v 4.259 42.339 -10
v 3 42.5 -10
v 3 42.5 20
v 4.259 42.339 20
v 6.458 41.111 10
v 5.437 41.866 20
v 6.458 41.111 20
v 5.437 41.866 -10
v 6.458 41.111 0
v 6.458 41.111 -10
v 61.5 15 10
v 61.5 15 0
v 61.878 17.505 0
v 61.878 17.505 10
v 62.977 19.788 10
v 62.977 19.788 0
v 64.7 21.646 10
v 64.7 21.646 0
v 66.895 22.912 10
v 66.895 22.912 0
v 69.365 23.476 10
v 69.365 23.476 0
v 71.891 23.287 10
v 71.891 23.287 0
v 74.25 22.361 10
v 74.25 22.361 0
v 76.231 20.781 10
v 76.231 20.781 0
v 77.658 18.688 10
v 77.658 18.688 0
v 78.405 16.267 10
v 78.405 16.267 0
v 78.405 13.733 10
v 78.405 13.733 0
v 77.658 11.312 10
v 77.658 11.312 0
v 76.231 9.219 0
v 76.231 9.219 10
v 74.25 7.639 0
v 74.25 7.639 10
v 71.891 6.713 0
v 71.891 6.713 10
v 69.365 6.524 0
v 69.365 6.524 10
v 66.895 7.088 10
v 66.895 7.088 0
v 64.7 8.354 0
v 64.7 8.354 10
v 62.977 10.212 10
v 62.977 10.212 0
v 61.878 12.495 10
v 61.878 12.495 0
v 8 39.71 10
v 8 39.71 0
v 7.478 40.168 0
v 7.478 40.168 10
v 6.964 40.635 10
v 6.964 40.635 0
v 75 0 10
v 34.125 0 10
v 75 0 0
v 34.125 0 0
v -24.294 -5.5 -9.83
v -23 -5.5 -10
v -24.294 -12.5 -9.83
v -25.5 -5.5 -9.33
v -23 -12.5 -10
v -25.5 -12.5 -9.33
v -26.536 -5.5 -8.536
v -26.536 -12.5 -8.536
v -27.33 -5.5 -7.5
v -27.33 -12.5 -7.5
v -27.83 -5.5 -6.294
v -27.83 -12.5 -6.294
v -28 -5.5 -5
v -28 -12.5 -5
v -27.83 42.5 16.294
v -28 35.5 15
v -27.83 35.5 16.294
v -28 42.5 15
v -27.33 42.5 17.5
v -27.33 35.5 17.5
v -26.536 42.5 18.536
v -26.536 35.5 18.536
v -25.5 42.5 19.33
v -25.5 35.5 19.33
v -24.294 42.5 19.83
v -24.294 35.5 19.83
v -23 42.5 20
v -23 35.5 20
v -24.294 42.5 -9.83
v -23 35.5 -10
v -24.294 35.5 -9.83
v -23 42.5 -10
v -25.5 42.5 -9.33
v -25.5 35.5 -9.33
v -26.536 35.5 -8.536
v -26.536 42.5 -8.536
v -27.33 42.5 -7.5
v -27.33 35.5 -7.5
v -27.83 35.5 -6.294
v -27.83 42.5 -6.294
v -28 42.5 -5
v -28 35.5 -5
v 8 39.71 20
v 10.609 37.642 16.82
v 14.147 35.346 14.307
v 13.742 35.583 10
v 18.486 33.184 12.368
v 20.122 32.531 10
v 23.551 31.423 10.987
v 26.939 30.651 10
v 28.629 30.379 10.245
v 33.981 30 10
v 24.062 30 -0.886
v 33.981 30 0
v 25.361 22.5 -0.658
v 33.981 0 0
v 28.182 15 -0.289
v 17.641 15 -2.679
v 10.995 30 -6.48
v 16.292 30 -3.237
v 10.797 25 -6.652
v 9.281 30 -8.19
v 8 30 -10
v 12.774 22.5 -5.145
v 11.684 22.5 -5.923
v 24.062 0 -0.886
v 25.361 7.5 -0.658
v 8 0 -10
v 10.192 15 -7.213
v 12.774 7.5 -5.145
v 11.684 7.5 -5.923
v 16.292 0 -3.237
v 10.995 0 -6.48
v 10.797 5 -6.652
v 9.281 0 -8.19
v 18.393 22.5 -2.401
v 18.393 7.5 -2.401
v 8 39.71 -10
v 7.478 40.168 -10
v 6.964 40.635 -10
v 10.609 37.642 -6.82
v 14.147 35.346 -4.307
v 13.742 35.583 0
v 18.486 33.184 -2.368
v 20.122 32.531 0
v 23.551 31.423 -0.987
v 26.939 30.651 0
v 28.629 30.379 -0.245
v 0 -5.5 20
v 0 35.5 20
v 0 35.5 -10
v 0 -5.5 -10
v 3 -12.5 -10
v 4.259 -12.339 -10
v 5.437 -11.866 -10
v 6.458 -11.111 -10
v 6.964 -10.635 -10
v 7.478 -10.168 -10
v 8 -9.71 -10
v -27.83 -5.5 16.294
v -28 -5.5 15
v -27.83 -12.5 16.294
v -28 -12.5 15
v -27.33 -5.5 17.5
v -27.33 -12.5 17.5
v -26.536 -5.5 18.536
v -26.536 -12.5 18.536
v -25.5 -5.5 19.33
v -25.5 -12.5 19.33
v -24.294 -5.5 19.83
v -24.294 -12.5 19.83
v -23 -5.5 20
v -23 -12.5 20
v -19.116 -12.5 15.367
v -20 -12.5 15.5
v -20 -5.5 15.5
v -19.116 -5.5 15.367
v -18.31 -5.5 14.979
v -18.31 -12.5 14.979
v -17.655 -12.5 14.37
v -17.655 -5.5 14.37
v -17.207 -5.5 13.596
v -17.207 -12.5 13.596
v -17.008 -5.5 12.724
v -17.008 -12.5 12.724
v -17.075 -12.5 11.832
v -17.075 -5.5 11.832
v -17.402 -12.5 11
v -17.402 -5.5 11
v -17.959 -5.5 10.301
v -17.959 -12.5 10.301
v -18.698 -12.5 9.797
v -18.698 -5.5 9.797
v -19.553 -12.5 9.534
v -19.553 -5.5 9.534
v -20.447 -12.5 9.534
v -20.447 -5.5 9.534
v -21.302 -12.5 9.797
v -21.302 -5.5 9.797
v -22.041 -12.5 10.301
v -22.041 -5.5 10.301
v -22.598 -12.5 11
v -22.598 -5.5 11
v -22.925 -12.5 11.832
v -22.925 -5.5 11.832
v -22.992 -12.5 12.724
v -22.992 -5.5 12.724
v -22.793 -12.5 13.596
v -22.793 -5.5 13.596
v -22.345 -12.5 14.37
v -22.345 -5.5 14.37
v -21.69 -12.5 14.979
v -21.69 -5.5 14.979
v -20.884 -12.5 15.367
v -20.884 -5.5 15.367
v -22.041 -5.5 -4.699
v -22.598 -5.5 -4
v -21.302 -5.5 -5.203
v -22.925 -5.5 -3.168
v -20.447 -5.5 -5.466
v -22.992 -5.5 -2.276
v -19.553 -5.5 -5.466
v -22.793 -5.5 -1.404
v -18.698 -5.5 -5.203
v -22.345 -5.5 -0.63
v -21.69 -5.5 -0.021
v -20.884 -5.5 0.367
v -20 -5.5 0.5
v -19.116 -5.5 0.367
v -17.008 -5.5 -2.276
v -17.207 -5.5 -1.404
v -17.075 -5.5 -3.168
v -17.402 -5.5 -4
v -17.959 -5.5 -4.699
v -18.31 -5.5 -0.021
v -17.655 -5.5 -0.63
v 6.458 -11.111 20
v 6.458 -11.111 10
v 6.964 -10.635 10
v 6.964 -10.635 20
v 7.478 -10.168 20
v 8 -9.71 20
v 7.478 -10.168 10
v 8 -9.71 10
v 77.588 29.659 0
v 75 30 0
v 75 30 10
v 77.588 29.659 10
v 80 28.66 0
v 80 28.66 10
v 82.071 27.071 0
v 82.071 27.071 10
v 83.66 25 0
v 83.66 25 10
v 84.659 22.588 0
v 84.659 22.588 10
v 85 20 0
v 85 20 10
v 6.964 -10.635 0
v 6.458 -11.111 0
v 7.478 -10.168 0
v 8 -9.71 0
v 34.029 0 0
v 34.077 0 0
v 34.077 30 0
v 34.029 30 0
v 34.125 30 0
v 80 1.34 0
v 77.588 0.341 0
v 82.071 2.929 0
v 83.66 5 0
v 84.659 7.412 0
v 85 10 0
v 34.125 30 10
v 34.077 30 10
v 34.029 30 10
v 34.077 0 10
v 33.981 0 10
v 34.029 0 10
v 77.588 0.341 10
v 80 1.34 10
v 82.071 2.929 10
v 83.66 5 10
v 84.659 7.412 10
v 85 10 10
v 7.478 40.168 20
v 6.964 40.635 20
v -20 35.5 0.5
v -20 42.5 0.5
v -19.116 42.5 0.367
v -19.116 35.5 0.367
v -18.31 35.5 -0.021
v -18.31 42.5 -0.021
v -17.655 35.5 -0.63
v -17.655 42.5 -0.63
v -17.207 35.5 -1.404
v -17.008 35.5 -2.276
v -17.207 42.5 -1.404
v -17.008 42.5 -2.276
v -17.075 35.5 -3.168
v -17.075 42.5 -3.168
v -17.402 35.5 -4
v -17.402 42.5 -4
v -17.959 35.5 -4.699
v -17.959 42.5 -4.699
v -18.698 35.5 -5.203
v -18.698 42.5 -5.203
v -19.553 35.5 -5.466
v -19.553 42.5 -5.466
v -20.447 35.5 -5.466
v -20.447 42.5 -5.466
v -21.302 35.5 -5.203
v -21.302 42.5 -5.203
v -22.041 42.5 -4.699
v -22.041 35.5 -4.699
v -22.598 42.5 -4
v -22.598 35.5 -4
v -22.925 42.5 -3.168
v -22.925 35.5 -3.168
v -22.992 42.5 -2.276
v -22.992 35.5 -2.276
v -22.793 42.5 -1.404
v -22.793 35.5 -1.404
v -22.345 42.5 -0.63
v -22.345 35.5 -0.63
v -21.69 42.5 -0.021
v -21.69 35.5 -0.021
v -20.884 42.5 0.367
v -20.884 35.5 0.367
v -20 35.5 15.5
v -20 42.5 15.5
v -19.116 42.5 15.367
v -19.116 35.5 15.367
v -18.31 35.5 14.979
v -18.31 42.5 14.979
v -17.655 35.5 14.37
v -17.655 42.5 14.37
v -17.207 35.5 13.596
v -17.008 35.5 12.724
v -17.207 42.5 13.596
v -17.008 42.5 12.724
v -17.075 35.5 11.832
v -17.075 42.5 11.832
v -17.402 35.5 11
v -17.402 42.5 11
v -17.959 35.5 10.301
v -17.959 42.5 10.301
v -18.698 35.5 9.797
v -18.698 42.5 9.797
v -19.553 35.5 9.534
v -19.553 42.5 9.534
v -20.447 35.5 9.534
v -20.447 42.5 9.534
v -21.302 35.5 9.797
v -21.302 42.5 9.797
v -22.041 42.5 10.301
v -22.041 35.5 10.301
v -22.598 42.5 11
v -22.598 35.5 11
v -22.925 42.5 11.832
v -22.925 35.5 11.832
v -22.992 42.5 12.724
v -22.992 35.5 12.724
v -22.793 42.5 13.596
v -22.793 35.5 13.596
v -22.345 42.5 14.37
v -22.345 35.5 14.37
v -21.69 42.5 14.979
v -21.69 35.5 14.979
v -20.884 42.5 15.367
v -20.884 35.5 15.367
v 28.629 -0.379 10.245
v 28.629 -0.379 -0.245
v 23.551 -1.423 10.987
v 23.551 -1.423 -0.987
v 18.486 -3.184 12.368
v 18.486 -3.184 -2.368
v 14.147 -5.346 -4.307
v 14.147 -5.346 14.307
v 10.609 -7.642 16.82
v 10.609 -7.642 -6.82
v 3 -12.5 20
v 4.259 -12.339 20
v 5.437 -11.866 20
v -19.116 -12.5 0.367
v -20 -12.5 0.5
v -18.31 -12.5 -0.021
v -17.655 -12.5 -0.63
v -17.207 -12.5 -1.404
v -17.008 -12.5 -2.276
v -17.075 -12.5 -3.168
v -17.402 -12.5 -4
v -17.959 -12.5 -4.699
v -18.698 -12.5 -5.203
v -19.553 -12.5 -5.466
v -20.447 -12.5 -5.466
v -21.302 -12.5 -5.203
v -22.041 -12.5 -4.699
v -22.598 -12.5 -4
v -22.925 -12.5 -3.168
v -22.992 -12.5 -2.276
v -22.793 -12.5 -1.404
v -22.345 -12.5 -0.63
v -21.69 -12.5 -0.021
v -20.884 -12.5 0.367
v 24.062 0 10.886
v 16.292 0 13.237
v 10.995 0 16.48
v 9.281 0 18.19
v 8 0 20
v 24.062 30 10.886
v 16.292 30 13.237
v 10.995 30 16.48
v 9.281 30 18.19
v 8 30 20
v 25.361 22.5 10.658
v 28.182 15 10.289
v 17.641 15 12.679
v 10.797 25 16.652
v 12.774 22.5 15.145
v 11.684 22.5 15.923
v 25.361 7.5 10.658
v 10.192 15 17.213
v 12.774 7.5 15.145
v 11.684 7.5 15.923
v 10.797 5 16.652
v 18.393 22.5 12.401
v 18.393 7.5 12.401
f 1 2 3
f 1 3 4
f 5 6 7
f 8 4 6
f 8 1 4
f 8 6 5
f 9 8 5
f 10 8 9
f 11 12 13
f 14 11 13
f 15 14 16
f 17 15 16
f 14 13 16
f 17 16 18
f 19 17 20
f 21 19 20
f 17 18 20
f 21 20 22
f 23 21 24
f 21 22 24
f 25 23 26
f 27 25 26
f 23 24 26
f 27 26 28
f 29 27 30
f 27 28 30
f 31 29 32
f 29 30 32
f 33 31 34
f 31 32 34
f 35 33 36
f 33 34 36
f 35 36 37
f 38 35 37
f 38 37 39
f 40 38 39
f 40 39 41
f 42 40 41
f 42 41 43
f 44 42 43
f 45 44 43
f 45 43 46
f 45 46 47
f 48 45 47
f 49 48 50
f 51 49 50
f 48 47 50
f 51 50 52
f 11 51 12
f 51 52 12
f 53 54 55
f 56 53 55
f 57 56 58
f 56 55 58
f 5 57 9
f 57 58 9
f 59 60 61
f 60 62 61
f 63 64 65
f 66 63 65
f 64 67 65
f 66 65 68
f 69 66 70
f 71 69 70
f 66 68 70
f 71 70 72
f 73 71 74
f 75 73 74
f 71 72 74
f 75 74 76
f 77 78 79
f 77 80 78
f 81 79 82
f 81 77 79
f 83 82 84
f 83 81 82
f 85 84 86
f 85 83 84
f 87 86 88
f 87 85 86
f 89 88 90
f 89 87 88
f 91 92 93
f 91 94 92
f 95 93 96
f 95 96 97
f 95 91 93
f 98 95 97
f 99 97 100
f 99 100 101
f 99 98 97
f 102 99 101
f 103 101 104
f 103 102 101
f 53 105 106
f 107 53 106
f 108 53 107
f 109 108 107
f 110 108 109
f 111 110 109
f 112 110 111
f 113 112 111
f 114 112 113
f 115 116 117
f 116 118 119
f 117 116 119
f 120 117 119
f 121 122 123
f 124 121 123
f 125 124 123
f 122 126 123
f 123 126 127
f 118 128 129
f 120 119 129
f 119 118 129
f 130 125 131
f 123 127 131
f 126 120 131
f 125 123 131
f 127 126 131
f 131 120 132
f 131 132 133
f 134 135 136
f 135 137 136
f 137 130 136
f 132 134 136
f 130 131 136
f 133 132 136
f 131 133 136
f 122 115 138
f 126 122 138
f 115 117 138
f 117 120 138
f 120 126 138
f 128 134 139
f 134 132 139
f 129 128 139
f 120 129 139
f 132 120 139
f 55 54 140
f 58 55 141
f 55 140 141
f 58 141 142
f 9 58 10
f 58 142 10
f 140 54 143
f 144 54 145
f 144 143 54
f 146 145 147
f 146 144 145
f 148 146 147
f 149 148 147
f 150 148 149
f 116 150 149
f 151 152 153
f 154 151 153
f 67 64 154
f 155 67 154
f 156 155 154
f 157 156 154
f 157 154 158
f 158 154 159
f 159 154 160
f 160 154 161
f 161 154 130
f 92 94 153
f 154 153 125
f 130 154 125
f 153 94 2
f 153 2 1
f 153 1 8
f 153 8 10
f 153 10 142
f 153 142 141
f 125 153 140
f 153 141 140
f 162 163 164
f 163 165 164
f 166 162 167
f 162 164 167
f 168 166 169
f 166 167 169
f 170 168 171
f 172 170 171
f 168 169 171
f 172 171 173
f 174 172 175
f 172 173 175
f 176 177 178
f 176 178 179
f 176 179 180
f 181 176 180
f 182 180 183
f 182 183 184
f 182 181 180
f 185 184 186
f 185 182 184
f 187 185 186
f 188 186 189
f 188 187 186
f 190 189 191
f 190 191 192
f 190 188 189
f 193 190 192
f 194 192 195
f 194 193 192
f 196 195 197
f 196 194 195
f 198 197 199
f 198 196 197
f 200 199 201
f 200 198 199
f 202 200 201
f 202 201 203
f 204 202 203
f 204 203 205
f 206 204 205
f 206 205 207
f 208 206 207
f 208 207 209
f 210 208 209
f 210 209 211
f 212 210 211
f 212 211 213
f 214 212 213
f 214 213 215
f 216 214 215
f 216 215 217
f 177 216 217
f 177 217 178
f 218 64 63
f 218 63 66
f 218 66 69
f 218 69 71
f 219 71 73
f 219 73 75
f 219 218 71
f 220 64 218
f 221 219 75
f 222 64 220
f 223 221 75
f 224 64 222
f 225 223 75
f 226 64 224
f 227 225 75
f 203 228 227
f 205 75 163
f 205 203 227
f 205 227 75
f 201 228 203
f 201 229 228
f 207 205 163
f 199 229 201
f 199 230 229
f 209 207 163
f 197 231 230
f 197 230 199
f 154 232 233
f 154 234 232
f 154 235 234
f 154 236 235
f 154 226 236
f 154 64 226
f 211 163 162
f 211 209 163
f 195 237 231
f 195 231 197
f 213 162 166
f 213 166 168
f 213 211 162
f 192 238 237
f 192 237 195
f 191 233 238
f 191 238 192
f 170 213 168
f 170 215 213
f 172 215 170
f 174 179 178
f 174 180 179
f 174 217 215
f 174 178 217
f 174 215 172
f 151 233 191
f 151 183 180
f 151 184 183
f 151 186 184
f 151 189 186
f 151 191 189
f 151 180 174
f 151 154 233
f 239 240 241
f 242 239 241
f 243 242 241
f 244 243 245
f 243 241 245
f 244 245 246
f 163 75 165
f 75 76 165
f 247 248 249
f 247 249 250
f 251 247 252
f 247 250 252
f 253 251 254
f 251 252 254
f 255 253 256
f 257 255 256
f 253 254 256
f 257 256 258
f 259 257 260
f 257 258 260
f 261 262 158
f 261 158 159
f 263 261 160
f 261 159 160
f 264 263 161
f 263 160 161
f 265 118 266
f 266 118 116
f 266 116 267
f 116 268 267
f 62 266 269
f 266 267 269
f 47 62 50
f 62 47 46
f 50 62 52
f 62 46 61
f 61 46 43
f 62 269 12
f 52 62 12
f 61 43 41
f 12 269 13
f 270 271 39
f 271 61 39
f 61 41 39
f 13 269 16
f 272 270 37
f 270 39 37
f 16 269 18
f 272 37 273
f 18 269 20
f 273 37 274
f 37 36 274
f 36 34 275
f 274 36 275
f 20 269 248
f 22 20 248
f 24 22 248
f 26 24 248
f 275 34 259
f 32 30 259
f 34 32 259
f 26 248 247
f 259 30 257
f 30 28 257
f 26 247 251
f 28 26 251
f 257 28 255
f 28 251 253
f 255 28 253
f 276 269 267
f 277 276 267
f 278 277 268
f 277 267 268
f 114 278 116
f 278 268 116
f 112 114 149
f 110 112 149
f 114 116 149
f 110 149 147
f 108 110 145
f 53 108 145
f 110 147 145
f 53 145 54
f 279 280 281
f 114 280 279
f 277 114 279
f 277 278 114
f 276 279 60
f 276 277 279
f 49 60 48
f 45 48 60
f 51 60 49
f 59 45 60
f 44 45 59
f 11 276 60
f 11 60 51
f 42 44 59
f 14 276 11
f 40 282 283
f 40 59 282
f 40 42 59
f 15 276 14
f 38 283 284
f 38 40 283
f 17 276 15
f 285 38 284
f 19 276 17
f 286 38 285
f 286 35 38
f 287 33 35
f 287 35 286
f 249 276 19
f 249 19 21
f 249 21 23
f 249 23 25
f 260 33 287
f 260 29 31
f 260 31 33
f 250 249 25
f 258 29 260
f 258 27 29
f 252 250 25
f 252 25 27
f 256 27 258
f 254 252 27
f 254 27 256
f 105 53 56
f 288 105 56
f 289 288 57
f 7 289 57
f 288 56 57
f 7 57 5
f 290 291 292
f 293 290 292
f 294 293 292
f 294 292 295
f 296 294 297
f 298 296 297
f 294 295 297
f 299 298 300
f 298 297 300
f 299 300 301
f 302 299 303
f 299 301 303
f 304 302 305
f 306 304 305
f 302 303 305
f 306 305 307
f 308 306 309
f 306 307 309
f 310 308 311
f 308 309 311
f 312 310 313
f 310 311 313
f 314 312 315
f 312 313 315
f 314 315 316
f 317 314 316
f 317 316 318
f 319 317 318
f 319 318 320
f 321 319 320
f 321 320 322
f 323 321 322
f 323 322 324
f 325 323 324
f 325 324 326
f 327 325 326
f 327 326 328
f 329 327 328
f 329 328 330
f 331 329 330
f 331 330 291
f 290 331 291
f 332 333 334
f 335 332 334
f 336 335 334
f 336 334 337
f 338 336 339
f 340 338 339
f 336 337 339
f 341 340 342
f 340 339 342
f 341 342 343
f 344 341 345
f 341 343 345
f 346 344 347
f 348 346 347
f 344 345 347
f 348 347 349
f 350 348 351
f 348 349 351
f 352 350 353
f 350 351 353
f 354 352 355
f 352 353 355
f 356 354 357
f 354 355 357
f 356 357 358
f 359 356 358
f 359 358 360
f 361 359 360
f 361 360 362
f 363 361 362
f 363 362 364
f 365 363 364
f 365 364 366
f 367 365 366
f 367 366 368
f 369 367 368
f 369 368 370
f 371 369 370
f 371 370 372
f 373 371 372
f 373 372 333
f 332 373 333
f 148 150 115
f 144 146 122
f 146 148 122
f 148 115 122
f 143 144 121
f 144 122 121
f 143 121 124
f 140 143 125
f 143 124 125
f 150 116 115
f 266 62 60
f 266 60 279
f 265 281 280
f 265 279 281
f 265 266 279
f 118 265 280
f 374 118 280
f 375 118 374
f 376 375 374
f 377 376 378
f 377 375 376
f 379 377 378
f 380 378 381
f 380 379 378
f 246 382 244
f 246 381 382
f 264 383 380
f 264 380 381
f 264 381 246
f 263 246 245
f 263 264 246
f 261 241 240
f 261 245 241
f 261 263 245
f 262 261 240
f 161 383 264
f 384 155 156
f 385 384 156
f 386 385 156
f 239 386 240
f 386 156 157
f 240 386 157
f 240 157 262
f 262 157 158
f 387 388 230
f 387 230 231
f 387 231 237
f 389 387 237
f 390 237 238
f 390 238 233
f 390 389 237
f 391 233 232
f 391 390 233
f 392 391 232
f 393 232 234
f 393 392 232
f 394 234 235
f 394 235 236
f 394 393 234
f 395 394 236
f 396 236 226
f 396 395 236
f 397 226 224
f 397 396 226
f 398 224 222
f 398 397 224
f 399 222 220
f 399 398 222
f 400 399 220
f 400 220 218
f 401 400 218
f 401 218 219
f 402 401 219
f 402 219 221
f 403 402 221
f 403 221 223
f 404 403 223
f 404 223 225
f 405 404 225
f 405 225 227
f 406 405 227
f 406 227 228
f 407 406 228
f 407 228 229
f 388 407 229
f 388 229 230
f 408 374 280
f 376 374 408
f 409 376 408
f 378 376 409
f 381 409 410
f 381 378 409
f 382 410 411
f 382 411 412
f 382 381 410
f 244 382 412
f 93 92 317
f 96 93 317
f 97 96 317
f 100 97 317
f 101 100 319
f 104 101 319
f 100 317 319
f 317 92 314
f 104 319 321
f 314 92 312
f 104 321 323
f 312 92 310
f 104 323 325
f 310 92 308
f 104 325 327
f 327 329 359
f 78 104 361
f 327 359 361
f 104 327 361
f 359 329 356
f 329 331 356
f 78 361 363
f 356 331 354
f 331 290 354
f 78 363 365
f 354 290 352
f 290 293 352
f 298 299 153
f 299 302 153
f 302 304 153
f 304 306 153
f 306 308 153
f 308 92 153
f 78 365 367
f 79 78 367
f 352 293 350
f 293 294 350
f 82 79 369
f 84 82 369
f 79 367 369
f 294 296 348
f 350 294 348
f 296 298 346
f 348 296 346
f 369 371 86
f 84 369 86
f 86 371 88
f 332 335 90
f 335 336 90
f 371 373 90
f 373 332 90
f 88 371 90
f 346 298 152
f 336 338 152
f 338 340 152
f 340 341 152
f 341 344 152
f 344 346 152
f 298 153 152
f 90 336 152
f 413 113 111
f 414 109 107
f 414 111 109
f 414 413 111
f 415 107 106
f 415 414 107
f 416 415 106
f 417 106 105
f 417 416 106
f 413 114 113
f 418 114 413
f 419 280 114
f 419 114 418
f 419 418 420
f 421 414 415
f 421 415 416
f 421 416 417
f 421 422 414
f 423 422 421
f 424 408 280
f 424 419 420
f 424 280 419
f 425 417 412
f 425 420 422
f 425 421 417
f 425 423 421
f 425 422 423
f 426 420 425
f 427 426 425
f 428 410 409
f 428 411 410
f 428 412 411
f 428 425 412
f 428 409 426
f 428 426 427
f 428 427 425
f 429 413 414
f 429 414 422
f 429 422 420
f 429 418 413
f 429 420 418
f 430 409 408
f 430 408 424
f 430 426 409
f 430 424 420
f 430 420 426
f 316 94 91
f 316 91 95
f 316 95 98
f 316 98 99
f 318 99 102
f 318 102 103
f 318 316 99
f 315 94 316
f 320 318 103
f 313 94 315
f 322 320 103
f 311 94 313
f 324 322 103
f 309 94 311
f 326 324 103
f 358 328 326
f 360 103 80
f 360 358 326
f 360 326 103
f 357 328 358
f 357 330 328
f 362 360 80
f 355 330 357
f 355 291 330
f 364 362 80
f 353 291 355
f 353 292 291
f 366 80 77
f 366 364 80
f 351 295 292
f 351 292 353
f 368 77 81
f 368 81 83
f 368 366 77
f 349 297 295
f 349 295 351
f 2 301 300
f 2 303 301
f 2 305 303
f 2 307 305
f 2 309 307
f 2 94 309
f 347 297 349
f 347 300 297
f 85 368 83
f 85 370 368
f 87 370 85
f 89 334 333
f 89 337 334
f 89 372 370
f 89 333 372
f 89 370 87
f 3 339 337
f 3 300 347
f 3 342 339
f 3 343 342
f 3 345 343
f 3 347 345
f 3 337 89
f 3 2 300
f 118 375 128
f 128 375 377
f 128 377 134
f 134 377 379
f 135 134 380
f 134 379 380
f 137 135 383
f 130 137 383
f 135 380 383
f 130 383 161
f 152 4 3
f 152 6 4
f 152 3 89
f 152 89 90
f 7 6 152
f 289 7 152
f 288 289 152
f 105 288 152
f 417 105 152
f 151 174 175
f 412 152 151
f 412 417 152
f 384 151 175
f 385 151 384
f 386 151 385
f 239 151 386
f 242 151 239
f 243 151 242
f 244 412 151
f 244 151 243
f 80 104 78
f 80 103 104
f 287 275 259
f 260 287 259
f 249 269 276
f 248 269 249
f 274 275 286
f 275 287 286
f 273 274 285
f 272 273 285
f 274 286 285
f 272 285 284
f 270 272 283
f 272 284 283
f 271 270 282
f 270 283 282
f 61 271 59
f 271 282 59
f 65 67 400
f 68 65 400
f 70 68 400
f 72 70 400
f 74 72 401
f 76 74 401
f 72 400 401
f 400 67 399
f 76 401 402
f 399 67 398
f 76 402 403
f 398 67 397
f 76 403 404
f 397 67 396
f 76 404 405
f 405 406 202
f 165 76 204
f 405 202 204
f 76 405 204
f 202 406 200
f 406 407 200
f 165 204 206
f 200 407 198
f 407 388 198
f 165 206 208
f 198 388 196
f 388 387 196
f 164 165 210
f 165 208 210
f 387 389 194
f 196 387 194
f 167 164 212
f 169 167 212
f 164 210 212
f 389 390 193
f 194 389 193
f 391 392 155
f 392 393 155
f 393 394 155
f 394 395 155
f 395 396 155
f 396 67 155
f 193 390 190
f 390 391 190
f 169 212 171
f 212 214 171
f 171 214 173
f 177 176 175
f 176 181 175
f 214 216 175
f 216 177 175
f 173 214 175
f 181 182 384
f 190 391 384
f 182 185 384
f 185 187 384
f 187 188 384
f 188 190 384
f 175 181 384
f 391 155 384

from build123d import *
from build123d.topology import SkipClean

# Parameters (mm, degrees)
SKETCH_1_W             = 85
SKETCH_1_H             = 30
EXTRUDE_1_DEPTH        = 10
EXTRUDE_2_DEPTH        = 10
EXTRUDE_2_DEPTH_BACK   = 20
SKETCH_3_W             = 8
SKETCH_3_H             = 30
SKETCH_2_R             = 8.5
CUT_EXTRUDE_1_DEPTH    = 10
SKETCH_5_W             = 8
SKETCH_5_H             = 30
EXTRUDE_3_DEPTH        = 12.5
SKETCH_6_W             = 30
SKETCH_6_H             = 7
EXTRUDE_4_DEPTH        = 28
CUT_EXTRUDE_2_REACH    = 99.115
SKETCH_7_R             = 3
FILLET_1_R             = 5
FILLET_1_OF_MIRROR_1_R = 5
FILLET_2_DEPTH         = 30
FILLET_3_DEPTH         = 30
FILLET_4_DEPTH         = 10
FILLET_START           = -9.709779072
FILLET_4_2_DEPTH       = 49.419558144
FILLET_START_2         = -11
FILLET_4_3_DEPTH       = 32
FILLET_START_3         = -10
FILLET_4_4_DEPTH       = 30
FILLET_6_R             = 10


with BuildPart() as part:
    # 草图1 → 凸台-拉伸1 (new body)
    with BuildSketch(Plane.XY):
        with Locations((42.5, 15)):
            Rectangle(SKETCH_1_W, SKETCH_1_H)
    extrude(amount=EXTRUDE_1_DEPTH)

    # 草图2 → 切除-拉伸1 (cut)
    with BuildSketch(Plane(origin=(0, 0, 0), x_dir=(-1, 0, 0), z_dir=(0, 0, -1))):
        with Locations((-70, 15)):
            Circle(SKETCH_2_R)
    extrude(amount=-CUT_EXTRUDE_1_DEPTH, mode=Mode.SUBTRACT)



with BuildPart() as body_2:
    # 草图3 → 凸台-拉伸2 (new, two sides: drawn at the far end of the back side and taken through both)
    with BuildSketch(Plane.XY.offset(10).offset(-EXTRUDE_2_DEPTH_BACK)):
        with Locations((4, 15)):
            Rectangle(SKETCH_3_W, SKETCH_3_H)
    extrude(amount=EXTRUDE_2_DEPTH + EXTRUDE_2_DEPTH_BACK)


with BuildPart() as part_1:
    add(part.part)

    add(body_2.part)  # 凸台-拉伸3 merges body 2
    # 草图5 → 凸台-拉伸3 (add)
    with BuildSketch(Plane(origin=(0, 30, 0), x_dir=(1, 0, 0), z_dir=(0, 1, 0))):
        with Locations((4, -5)):
            Rectangle(SKETCH_5_W, SKETCH_5_H)
    extrude_3 = extrude(amount=EXTRUDE_3_DEPTH)

    # 草图6 → 凸台-拉伸4 (add)
    with BuildSketch(Plane.ZY):
        with Locations((5, 39)):
            Rectangle(SKETCH_6_W, SKETCH_6_H)
    extrude_4 = extrude(amount=EXTRUDE_4_DEPTH)

    # 草图7 → 切除-拉伸2 (cut, up to next)
    with BuildSketch(Plane(origin=(0, 42.5, 0), x_dir=(1, 0, 0), z_dir=(0, 1, 0)), mode=Mode.PRIVATE) as cut_extrude_2_sk1:
        with Locations(Location((-20, 2.5, 0), (0, 0, 270))):
            Circle(SKETCH_7_R)
    cut_extrude_2_tool1 = extrude(cut_extrude_2_sk1.sketch, amount=-CUT_EXTRUDE_2_REACH, mode=Mode.PRIVATE) & part_1.part
    # 草图7 → 切除-拉伸2 (cut, up to next)
    with BuildSketch(Plane(origin=(0, 42.5, 0), x_dir=(1, 0, 0), z_dir=(0, 1, 0)), mode=Mode.PRIVATE) as cut_extrude_2_sk2:
        with Locations(Location((-20, -12.5, 0), (0, 0, 270))):
            Circle(SKETCH_7_R)
    cut_extrude_2_tool2 = extrude(cut_extrude_2_sk2.sketch, amount=-CUT_EXTRUDE_2_REACH, mode=Mode.PRIVATE) & part_1.part
    cut_extrude_2_1 = cut_extrude_2_tool1.solids().sort_by_distance((-20, 42.5, -2.5))[0]
    add(cut_extrude_2_1, mode=Mode.SUBTRACT)
    cut_extrude_2_2 = cut_extrude_2_tool2.solids().sort_by_distance((-20, 42.5, 12.5))[0]
    add(cut_extrude_2_2, mode=Mode.SUBTRACT)
    cut_extrude_2 = cut_extrude_2_1 + cut_extrude_2_2  # 切除-拉伸2 as one shape, for the pattern or mirror that repeats it

    # 圆角1
    fillet_1_edges = [part_1.edges().sort_by_distance(p)[0] for p in [
        (8, 42.5, 5),
        (-28, 39, -10),
        (-28, 39, 20),
    ]]
    fillet(fillet_1_edges, radius=FILLET_1_R)

    # 镜向1: 凸台-拉伸3, 凸台-拉伸4, 切除-拉伸2 across plane
    add(extrude_3.mirror(Plane.ZX.offset(15)))
    add(extrude_4.mirror(Plane.ZX.offset(15)))
    add(cut_extrude_2.mirror(Plane.ZX.offset(15)), mode=Mode.SUBTRACT)

    # 圆角1 of 镜向1
    fillet_1_of_mirror_1_edges = [part_1.edges().sort_by_distance(p)[0] for p in [
        (8, -12.5, 5),
        (-28, -9, -10),
        (-28, -9, 20),
    ]]
    fillet(fillet_1_of_mirror_1_edges, radius=FILLET_1_OF_MIRROR_1_R)

    # 圆角2: read off the stored shape, not the designer's step
    # 圆角2 outline → 圆角2 (add)
    with BuildSketch(Plane(origin=(0, 0, 0), x_dir=(1, 0, 0), z_dir=(0, 1, 0))):
        with BuildLine():
            add(Edge.make_bspline(
                [(33.980762114, -10), (13.773502692, -10), (8, -20)],
                knots=[0, 0, 0, 1, 1, 1], degree=2, weights=[1, 0.866025404, 1]))
            Line((33.980762114, -10), (8, -10))
            Line((8, -10), (8, -20))
        make_face()
    extrude(amount=FILLET_2_DEPTH)

    # 圆角3: read off the stored shape, not the designer's step
    # 圆角3 outline → 圆角3 (add)
    with BuildSketch(Plane(origin=(0, 0, 0), x_dir=(1, 0, 0), z_dir=(0, 1, 0))):
        with BuildLine():
            Line((8, 0), (33.980762114, 0))
            add(Edge.make_bspline(
                [(33.980762114, 0), (13.773502692, 0), (8, 10)],
                knots=[0, 0, 0, 1, 1, 1], degree=2, weights=[1, 0.866025404, 1]))
            Line((8, 10), (8, 0))
        make_face()
    extrude(amount=FILLET_3_DEPTH)

    # 圆角4: read off the stored shape, not the designer's step
    # 圆角4 outline → 圆角4 (add)
    with BuildSketch(Plane.XY):
        with BuildLine():
            ThreePointArc((6.458305444, -11.111111111), (19.217629145, -2.881570914), (34.124748995, 0))
            Line((34.124748995, 0), (8, 0))
            Line((8, 0), (8, -7.5))
            ThreePointArc((8, -7.5), (7.598452306, -9.463220922), (6.458305444, -11.111111111))
        make_face()
        with BuildLine():
            ThreePointArc((34.124748995, 30), (19.217629145, 32.881570914), (6.458305444, 41.111111111))
            ThreePointArc((6.458305444, 41.111111111), (7.598452306, 39.463220922), (8, 37.5))
            Line((8, 37.5), (8, 30))
            Line((8, 30), (34.124748995, 30))
        make_face()
    extrude(amount=FILLET_4_DEPTH)

    # Fillet 4 2 outline → Fillet 4 2 (add)
    with BuildSketch(Plane(origin=(0, 0, 0), x_dir=(1, 0, 0), z_dir=(0, 1, 0)).offset(FILLET_START)):
        with BuildLine():
            add(Edge.make_bspline(
                [(33.980762114, -10), (13.773502692, -10), (8, -20)],
                knots=[0, 0, 0, 1, 1, 1], degree=2, weights=[1, 0.866025404, 1]))
            Line((33.980762114, -10), (8, -10))
            Line((8, -10), (8, -20))
        make_face()
        with BuildLine():
            Line((8, 0), (33.980762114, 0))
            add(Edge.make_bspline(
                [(33.980762114, 0), (13.773502692, 0), (8, 10)],
                knots=[0, 0, 0, 1, 1, 1], degree=2, weights=[1, 0.866025404, 1]))
            Line((8, 10), (8, 0))
        make_face()
    extrude(amount=FILLET_4_2_DEPTH)

    # Fillet 4 3 outline → Fillet 4 3 (cut)
    with SkipClean():  # the faces are left unmerged after this step: merging them gives an invalid solid
        with BuildSketch(Plane.XY.offset(FILLET_START_2)):
            with BuildLine():
                Line((35, 0), (34.124748995, 0))
                ThreePointArc((34.124748995, 0), (20.189341563, -2.505941541), (7.99999995, -9.709779014))
                ThreePointArc((7.99999995, -9.709779014), (7.220027604, -10.400405968), (6.458305444, -11.111111111))
                Line((6.458305444, -11.111111111), (5, -12.507707754))
                Line((5, -12.507707754), (5, -13))
                Line((5, -13), (35, -13))
                Line((35, -13), (35, 0))
            make_face()
            with BuildLine():
                Line((34.124748995, 30), (35, 30))
                Line((35, 30), (35, 43))
                Line((35, 43), (5, 43))
                Line((5, 43), (5, 42.507707754))
                Line((5, 42.507707754), (6.458305444, 41.111111111))
                ThreePointArc((6.458305444, 41.111111111), (7.220027604, 40.400405968), (7.99999995, 39.709779014))
                ThreePointArc((7.99999995, 39.709779014), (20.189341563, 32.505941541), (34.124748995, 30))
            make_face()
        extrude(amount=FILLET_4_3_DEPTH, mode=Mode.SUBTRACT)
    add(part_1.part.scale(1), mode=Mode.REPLACE)  # the faces are merged on a copy

    # Fillet 4 4 outline → Fillet 4 4 (add)
    with BuildSketch(Plane.XY.offset(FILLET_START_3)):
        with BuildLine():
            ThreePointArc((6.458305444, -11.111111111), (7.220027604, -10.400405968), (7.99999995, -9.709779014))
            Line((7.99999995, -9.709779014), (8, -7.5))
            ThreePointArc((8, -7.5), (7.598452306, -9.463220922), (6.458305444, -11.111111111))
        make_face()
        with BuildLine():
            Line((8, 37.5), (7.99999995, 39.709779014))
            ThreePointArc((7.99999995, 39.709779014), (7.220027604, 40.400405968), (6.458305444, 41.111111111))
            ThreePointArc((6.458305444, 41.111111111), (7.598452306, 39.463220922), (8, 37.5))
        make_face()
    extrude(amount=FILLET_4_4_DEPTH)

    # 圆角6
    fillet_6_edges = [part_1.edges().sort_by_distance(p)[0] for p in [
        (85, 0, 5),
        (85, 30, 5),
    ]]
    fillet(fillet_6_edges, radius=FILLET_6_R)


solid = part_1.part
